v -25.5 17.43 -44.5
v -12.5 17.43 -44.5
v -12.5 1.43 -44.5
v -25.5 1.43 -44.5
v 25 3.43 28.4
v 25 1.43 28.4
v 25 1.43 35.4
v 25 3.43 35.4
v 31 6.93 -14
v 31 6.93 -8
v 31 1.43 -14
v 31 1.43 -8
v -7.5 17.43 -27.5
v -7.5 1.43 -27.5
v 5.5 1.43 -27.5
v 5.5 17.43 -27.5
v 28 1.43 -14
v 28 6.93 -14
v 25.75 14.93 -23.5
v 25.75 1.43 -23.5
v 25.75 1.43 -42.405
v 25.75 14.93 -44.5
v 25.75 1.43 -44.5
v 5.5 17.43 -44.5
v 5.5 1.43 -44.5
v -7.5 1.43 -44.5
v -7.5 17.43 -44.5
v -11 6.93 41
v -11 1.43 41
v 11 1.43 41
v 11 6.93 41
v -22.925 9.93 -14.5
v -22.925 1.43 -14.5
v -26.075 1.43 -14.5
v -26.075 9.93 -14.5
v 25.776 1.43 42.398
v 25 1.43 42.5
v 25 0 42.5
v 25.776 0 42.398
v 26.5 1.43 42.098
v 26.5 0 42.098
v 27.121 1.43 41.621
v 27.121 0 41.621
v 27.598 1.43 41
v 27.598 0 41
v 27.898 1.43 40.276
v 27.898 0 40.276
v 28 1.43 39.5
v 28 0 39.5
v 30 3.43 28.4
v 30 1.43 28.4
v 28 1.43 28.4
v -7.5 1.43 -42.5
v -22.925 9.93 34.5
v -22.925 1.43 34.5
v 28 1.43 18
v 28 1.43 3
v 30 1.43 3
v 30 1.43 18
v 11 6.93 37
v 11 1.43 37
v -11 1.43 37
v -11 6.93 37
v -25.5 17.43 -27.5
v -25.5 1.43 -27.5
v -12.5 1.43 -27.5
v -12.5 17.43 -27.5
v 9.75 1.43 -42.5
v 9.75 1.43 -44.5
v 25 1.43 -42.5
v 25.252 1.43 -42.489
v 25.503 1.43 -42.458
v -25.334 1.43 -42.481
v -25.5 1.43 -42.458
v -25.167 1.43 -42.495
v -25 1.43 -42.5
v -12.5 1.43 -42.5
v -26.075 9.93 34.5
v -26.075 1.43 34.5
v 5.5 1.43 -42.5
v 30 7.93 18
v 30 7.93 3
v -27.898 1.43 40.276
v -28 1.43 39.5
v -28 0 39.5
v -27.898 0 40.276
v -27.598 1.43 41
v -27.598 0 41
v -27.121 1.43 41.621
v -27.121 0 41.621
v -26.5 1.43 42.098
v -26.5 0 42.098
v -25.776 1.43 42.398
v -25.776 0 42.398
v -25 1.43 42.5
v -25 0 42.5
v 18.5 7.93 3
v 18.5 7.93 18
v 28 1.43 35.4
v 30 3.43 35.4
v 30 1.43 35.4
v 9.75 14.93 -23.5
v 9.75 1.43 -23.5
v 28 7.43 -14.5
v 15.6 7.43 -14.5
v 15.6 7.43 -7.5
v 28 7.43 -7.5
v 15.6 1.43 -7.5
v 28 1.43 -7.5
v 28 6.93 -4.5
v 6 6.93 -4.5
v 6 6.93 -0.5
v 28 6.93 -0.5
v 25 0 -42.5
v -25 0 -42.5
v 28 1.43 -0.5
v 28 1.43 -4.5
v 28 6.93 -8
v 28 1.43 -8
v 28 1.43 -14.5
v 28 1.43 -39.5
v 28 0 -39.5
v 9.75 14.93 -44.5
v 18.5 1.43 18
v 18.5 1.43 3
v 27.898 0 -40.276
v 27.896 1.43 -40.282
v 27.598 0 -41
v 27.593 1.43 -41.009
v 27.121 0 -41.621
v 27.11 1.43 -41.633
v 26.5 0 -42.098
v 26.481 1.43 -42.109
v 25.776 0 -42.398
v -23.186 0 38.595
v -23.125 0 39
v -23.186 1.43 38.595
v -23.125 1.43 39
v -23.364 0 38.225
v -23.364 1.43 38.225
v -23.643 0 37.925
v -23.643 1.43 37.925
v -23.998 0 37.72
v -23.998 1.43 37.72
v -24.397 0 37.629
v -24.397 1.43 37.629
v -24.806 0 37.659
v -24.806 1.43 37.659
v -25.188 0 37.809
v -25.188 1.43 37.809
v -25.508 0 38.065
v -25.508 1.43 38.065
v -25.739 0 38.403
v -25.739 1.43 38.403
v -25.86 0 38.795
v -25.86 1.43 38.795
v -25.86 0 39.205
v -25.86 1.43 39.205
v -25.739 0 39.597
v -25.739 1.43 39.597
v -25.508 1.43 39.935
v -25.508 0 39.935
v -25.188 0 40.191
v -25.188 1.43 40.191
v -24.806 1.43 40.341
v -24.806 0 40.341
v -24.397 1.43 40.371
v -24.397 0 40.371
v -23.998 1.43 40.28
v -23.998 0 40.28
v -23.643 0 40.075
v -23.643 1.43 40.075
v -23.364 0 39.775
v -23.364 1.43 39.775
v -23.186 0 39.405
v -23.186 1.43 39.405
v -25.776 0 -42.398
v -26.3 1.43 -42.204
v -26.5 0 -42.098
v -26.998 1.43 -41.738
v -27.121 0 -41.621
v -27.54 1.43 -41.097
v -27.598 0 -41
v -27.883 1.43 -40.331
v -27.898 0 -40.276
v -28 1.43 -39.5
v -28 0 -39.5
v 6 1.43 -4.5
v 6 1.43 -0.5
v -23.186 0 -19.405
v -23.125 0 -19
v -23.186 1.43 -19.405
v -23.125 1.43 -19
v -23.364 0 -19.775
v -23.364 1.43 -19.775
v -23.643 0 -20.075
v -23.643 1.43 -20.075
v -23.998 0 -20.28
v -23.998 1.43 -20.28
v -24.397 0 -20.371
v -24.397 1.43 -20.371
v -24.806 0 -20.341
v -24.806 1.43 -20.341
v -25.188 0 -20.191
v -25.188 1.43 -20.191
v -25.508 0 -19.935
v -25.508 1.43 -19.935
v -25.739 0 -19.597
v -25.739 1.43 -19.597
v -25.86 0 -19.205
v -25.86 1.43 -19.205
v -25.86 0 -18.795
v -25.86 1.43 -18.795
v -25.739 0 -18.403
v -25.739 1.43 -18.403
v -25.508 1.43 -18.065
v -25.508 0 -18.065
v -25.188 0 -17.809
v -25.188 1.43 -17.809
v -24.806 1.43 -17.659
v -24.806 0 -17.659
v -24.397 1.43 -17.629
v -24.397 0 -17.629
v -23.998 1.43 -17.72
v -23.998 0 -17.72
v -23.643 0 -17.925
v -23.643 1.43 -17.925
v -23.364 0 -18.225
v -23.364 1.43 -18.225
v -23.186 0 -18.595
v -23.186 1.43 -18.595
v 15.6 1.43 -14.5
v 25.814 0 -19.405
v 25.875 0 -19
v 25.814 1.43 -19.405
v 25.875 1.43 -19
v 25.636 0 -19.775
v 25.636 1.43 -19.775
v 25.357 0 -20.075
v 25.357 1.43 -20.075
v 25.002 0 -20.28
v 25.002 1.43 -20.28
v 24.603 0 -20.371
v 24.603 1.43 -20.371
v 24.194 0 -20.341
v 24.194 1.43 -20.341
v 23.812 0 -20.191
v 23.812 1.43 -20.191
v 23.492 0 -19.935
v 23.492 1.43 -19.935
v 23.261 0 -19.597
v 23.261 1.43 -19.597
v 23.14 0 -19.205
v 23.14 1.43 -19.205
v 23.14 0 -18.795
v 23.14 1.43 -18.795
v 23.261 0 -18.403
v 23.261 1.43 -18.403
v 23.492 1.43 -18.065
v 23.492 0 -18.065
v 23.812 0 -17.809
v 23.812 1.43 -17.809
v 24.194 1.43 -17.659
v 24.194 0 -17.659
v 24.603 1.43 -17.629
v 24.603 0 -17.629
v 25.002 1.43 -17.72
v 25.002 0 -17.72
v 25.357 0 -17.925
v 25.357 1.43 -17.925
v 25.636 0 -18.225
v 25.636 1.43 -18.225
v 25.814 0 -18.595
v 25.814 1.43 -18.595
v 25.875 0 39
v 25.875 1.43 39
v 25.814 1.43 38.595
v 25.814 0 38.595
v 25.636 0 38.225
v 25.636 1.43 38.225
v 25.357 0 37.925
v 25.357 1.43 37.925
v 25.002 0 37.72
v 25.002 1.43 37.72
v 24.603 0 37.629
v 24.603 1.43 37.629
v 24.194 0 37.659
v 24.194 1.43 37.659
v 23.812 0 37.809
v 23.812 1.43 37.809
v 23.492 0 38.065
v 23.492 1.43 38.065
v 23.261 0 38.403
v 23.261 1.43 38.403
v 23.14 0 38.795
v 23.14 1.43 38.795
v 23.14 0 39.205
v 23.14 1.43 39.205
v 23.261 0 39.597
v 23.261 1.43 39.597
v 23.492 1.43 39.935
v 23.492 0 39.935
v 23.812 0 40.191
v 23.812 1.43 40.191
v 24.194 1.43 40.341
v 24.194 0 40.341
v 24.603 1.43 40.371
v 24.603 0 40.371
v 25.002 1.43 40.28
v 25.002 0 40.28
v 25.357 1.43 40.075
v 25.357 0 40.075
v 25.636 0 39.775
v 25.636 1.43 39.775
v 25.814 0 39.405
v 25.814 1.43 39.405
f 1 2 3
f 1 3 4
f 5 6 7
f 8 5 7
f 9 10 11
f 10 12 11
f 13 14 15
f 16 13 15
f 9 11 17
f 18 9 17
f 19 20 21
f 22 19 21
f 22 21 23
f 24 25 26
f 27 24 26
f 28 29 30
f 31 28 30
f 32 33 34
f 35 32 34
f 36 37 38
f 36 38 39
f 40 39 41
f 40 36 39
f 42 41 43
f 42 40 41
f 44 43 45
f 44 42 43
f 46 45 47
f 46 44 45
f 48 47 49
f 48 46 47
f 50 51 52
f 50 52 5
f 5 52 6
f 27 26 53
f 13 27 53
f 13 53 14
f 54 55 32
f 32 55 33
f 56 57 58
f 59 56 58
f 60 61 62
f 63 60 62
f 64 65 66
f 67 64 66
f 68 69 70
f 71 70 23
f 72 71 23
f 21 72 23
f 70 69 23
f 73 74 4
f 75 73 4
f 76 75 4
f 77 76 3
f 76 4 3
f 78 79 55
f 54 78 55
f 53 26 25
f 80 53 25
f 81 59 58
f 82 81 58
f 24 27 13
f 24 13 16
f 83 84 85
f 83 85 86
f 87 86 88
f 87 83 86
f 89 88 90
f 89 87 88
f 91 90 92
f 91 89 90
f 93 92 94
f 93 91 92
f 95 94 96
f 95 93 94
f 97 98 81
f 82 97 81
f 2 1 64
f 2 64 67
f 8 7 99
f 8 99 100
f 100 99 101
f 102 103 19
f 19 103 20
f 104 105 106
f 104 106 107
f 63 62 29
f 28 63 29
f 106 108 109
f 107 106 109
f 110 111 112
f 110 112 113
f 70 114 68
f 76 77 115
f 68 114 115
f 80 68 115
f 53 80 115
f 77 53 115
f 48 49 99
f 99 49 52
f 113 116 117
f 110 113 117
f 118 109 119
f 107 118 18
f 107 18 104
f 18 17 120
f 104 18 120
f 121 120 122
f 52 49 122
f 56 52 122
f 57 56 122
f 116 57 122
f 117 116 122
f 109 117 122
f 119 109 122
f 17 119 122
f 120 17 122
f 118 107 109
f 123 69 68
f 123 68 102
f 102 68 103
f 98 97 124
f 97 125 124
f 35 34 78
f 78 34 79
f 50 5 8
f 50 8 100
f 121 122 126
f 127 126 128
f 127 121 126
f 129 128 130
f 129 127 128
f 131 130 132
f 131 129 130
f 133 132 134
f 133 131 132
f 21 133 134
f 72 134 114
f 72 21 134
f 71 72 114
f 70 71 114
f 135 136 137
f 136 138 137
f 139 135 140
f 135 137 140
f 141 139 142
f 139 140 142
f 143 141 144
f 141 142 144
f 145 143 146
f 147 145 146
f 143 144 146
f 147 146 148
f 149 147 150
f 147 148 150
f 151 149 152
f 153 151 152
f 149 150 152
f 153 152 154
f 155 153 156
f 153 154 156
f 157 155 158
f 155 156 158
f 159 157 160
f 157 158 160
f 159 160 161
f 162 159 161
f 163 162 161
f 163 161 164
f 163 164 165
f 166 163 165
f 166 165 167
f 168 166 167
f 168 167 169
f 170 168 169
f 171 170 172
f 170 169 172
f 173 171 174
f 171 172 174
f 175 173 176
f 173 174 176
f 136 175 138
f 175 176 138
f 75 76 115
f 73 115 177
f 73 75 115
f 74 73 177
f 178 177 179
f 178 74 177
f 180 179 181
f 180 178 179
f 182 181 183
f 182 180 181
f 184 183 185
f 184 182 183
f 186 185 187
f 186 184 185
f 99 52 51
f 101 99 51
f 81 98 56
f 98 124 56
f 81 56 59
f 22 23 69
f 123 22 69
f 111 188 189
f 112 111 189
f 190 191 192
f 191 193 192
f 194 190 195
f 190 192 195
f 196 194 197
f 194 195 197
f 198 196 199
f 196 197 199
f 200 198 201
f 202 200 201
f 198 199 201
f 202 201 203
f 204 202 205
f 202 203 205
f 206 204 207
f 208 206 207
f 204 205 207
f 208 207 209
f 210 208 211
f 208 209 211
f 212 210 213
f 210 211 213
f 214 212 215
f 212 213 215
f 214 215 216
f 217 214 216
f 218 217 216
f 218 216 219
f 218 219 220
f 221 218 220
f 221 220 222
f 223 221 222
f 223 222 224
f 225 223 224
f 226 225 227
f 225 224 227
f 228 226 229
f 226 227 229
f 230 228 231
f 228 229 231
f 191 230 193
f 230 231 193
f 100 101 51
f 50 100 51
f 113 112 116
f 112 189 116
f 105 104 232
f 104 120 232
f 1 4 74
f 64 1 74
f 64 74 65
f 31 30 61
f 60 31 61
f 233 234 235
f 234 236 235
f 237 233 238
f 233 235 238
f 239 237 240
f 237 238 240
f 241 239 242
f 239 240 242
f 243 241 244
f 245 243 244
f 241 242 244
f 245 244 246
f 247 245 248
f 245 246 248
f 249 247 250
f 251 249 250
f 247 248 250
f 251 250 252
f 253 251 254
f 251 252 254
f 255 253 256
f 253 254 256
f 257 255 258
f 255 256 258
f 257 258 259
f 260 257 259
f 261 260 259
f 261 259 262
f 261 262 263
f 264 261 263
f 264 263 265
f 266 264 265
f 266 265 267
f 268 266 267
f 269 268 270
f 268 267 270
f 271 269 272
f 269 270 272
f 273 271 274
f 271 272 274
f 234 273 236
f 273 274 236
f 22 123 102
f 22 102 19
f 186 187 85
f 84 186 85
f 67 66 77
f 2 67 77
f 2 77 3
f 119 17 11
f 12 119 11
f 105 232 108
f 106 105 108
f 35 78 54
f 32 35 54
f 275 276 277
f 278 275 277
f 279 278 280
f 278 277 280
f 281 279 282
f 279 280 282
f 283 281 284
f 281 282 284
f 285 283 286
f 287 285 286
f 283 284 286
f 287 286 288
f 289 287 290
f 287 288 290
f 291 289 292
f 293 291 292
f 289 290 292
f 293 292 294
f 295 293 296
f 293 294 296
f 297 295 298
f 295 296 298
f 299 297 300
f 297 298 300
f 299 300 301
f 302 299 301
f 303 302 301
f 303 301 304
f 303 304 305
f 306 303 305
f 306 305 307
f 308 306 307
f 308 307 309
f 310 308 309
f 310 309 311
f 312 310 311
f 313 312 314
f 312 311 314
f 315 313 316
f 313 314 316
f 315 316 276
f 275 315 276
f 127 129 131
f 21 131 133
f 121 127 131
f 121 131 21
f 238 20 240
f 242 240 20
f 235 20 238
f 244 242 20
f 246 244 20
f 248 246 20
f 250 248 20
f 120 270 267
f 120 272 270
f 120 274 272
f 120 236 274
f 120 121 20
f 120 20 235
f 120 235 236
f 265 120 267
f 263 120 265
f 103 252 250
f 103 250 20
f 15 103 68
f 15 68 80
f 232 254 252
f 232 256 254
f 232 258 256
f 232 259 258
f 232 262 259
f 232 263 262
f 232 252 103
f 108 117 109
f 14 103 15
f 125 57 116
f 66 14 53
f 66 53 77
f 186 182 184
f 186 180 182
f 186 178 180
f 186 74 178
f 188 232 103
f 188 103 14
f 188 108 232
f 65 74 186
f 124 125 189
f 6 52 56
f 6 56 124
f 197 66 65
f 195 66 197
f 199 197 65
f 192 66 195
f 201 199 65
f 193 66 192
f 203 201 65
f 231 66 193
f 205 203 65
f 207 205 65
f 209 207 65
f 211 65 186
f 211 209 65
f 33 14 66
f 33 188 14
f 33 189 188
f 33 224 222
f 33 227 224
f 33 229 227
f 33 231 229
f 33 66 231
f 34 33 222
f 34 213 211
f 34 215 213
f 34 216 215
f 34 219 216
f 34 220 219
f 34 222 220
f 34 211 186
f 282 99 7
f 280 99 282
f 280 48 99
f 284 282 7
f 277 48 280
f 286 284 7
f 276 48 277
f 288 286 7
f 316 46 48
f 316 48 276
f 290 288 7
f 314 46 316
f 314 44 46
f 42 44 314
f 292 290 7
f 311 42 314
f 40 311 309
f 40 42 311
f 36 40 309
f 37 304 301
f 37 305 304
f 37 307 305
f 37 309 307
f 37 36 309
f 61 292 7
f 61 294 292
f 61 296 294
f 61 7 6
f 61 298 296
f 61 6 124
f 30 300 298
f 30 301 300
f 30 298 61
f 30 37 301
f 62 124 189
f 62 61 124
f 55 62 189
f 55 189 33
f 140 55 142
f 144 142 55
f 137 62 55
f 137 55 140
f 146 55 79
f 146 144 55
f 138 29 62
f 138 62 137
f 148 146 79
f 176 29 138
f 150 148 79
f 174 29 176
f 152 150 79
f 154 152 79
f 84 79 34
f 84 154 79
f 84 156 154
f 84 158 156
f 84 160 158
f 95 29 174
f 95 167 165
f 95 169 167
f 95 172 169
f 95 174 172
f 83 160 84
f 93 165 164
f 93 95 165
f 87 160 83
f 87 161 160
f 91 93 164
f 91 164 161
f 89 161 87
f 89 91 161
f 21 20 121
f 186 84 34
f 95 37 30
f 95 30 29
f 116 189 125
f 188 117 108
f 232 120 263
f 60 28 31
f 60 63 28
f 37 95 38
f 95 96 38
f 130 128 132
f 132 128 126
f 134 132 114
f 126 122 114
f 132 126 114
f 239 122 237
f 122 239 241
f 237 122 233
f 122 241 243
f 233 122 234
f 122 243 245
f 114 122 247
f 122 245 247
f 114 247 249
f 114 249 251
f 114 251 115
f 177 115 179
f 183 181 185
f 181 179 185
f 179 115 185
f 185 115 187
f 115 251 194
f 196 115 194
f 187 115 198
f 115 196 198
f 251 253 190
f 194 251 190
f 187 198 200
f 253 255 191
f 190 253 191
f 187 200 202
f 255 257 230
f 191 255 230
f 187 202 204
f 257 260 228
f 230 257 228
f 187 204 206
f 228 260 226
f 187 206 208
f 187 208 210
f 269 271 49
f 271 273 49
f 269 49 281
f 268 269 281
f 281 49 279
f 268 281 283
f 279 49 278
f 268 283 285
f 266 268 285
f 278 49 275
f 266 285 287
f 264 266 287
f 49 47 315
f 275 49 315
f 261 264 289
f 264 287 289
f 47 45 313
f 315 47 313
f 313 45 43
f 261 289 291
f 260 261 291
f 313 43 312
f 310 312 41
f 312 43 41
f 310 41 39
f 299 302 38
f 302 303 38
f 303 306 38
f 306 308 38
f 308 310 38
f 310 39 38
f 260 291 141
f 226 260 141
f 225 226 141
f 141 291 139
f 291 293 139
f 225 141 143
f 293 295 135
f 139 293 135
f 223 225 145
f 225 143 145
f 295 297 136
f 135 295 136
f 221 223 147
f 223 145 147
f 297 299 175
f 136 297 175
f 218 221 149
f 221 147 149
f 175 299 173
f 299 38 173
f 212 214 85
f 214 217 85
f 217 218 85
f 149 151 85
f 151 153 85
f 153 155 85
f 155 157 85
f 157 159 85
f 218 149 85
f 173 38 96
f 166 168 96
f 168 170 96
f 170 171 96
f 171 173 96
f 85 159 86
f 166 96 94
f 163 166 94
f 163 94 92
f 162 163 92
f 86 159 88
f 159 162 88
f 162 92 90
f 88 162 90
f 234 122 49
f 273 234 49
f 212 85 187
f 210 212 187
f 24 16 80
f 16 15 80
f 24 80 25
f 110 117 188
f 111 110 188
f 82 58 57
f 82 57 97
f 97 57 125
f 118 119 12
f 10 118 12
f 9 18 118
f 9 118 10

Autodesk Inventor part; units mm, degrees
ref_plane "YZ Plane" through (0, 0, 0) normal (1, 0, 0) x (0, 1, 0)
ref_plane "XZ Plane" through (0, 0, 0) normal (0, 1, 0) x (-1, 0, 0)
ref_plane "XY Plane" through (0, 0, 0) normal (0, 0, 1) x (1, 0, 0)
sketch "Sketch1" plane through (0, 0, 0) normal (0, 1, 0) x (-1, 0, 0)
  line L0 (28, 42.5) -> (-28, 42.5)
  line L1 (-28, 42.5) -> (-28, -42.5)
  line L2 (-28, -42.5) -> (28, -42.5)
  line L3 (28, -42.5) -> (28, 42.5)
  point P0 (0, 0)
  point P1 (28, 0)
  point P2 (0, -42.5)
  dimension "d0" = 85
  dimension "d1" = 56
extrude "Extrusion1" add sketch "Sketch1" along normal blind 1.43
sketch "Sketch2" plane through (0, 1.43, 0) normal (0, 1, 0) x (1, 0, 0)
  line L0 (-28, -42.5) -> (28, -42.5) projected
  line L1 (28, -42.5) -> (28, 42.5) projected
  line L2 (28, 42.5) -> (-28, 42.5) projected
  line L3 (-28, 42.5) -> (-28, -42.5) projected
  circle A0 centre (-24.5, -39) radius 1.375
  circle A1 centre (-24.5, 19) radius 1.375
  circle A2 centre (24.5, 19) radius 1.375
  circle A3 centre (24.5, -39) radius 1.375
  point P0 (0, 0)
  dimension "d4" = 2.75
  dimension "d5" = 2.75
  dimension "d6" = 2.75
  dimension "d7" = 2.75
  dimension "d8" = 49
  dimension "d9" = 58
  dimension "d10" = 3.5
  dimension "d11" = 3.5
extrude "Extrusion2" cut sketch "Sketch2" against normal through all contours A0 | A1 | A2 | A3
fillet "Fillet1" radius 3 4 edges at (-28, 0.715, 42.5) (28, 0.715, 42.5) (28, 0.715, -42.5) (-28, 0.715, -42.5)
sketch "Sketch3" plane through (0, 1.43, 0) normal (0, 1, 0) x (1, 0, 0)
  circle A0 centre (24.5, 19) radius 1.375 projected
  circle A1 centre (-24.5, -39) radius 1.375 projected
  circle A2 centre (-24.5, 19) radius 1.375 projected
  circle A3 centre (24.5, -39) radius 1.375 projected
  arc A4 (-25, 42.5) -> (-28, 39.5) centre (-25, 39.5) ccw projected
  line L0 (-28, 39.5) -> (-28, -39.5) projected
  arc A5 (-28, -39.5) -> (-25, -42.5) centre (-25, -39.5) ccw projected
  line L1 (-25, -42.5) -> (25, -42.5) projected
  arc A6 (25, -42.5) -> (28, -39.5) centre (25, -39.5) ccw projected
  line L2 (28, -39.5) -> (28, 39.5) projected
  arc A7 (28, 39.5) -> (25, 42.5) centre (25, 39.5) ccw projected
  line L3 (25, 42.5) -> (-25, 42.5) projected
  line L4 (-25.5, 27.5) -> (-12.5, 27.5)
  line L5 (-12.5, 27.5) -> (-12.5, 44.5)
  line L6 (-12.5, 44.5) -> (-25.5, 44.5)
  line L7 (-25.5, 44.5) -> (-25.5, 27.5)
  line L8 (-7.5, 27.5) -> (5.5, 27.5)
  line L9 (5.5, 27.5) -> (5.5, 44.5)
  line L10 (5.5, 44.5) -> (-7.5, 44.5)
  line L11 (-7.5, 44.5) -> (-7.5, 27.5)
  point P0 (0, 0)
  point P1 (-19, 44.5)
  point P2 (-1, 44.5)
  dimension "d15" = 2
  dimension "d16" = 29
  dimension "d17" = 47
  dimension "d18" = 13
  dimension "d19" = 13
  dimension "d20" = 17
extrude "Extrusion3" add sketch "Sketch3" along normal blind 16 contours L3 L5 L4 L7 A4 | A4 L7 L6 L5 L3 | L11 L10 L9 L3 | L3 L9 L8 L11
sketch "Sketch4" plane through (0, 1.43, 0) normal (0, 1, 0) x (1, 0, 0)
  line L0 (-7.5, 27.5) -> (-7.5, 42.5) projected
  line L1 (-7.5, 42.5) -> (-12.5, 42.5) projected
  line L2 (-12.5, 42.5) -> (-12.5, 27.5) projected
  line L3 (-12.5, 27.5) -> (-25.5, 27.5) projected
  line L4 (-25.5, 27.5) -> (-25.5, 42.458) projected
  arc A0 (-25.5, 42.458) -> (-28, 39.5) centre (-25, 39.5) ccw projected
  line L5 (-28, 39.5) -> (-28, -39.5) projected
  arc A1 (-28, -39.5) -> (-25, -42.5) centre (-25, -39.5) ccw projected
  line L6 (-25, -42.5) -> (25, -42.5) projected
  arc A2 (25, -42.5) -> (28, -39.5) centre (25, -39.5) ccw projected
  line L7 (28, -39.5) -> (28, 39.5) projected
  arc A3 (28, 39.5) -> (25, 42.5) centre (25, 39.5) ccw projected
  line L8 (25, 42.5) -> (5.5, 42.5) projected
  line L9 (5.5, 42.5) -> (5.5, 27.5) projected
  line L10 (5.5, 27.5) -> (-7.5, 27.5) projected
  circle A4 centre (24.5, 19) radius 1.375 projected
  circle A5 centre (-24.5, -39) radius 1.375 projected
  circle A6 centre (-24.5, 19) radius 1.375 projected
  circle A7 centre (24.5, -39) radius 1.375 projected
  line L11 (-7.5, 27.5) -> (5.5, 27.5) projected
  line L12 (5.5, 27.5) -> (5.5, 44.5) projected
  line L13 (5.5, 44.5) -> (-7.5, 44.5) projected
  line L14 (-7.5, 44.5) -> (-7.5, 27.5) projected
  line L15 (9.75, 23.5) -> (25.75, 23.5)
  line L16 (25.75, 23.5) -> (25.75, 44.5)
  line L17 (25.75, 44.5) -> (9.75, 44.5)
  line L18 (9.75, 44.5) -> (9.75, 23.5)
  point P0 (0, 0)
  point P1 (17.75, 44.5)
  dimension "d23" = 10.25
  dimension "d24" = 21
  dimension "d25" = 16
extrude "Extrusion4" add sketch "Sketch4" along normal blind 13.5 contours L18 L17 L16 A3 L8 | L8 A3 L16 L15 L18
sketch "Sketch5" plane through (0, 1.43, 0) normal (0, 1, 0) x (1, 0, 0)
  line L0 (9.75, 23.5) -> (9.75, 42.5) projected
  line L1 (9.75, 42.5) -> (5.5, 42.5) projected
  line L2 (5.5, 42.5) -> (5.5, 27.5) projected
  line L3 (5.5, 27.5) -> (-7.5, 27.5) projected
  line L4 (-7.5, 27.5) -> (-7.5, 42.5) projected
  line L5 (-7.5, 42.5) -> (-12.5, 42.5) projected
  line L6 (-12.5, 42.5) -> (-12.5, 27.5) projected
  line L7 (-12.5, 27.5) -> (-25.5, 27.5) projected
  line L8 (-25.5, 27.5) -> (-25.5, 42.458) projected
  arc A0 (-25.5, 42.458) -> (-28, 39.5) centre (-25, 39.5) ccw projected
  line L9 (-28, 39.5) -> (-28, -39.5) projected
  arc A1 (-28, -39.5) -> (-25, -42.5) centre (-25, -39.5) ccw projected
  line L10 (-25, -42.5) -> (25, -42.5) projected
  arc A2 (25, -42.5) -> (28, -39.5) centre (25, -39.5) ccw projected
  line L11 (28, -39.5) -> (28, 39.5) projected
  arc A3 (28, 39.5) -> (25.75, 42.4047) centre (25, 39.5) ccw projected
  line L12 (25.75, 42.4047) -> (25.75, 23.5) projected
  line L13 (25.75, 23.5) -> (9.75, 23.5) projected
  circle A4 centre (24.5, 19) radius 1.375 projected
  circle A5 centre (-24.5, -39) radius 1.375 projected
  circle A6 centre (-24.5, 19) radius 1.375 projected
  circle A7 centre (24.5, -39) radius 1.375 projected
  line L14 (-26.075, -34.5) -> (-22.925, -34.5)
  line L15 (-22.925, -34.5) -> (-22.925, 14.5)
  line L16 (-22.925, 14.5) -> (-26.075, 14.5)
  line L17 (-26.075, 14.5) -> (-26.075, -34.5)
  point P0 (0, 0)
  point P1 (-26.075, -10)
  point P2 (-24.5, -34.5)
  dimension "d28" = 3.15
  dimension "d29" = 49
  dimension "d31" = 29
extrude "Extrusion5" add sketch "Sketch5" along normal blind 8.5 contours L17 L16 L15 L14
sketch "Sketch6" plane through (0, 1.43, 0) normal (0, 1, 0) x (1, 0, 0)
  line L0 (-26.075, -34.5) -> (-26.075, 14.5) projected
  line L1 (-26.075, 14.5) -> (-22.925, 14.5) projected
  line L2 (-22.925, 14.5) -> (-22.925, -34.5) projected
  line L3 (-22.925, -34.5) -> (-26.075, -34.5) projected
  line L4 (9.75, 23.5) -> (9.75, 42.5) projected
  line L5 (9.75, 42.5) -> (5.5, 42.5) projected
  line L6 (5.5, 42.5) -> (5.5, 27.5) projected
  line L7 (5.5, 27.5) -> (-7.5, 27.5) projected
  line L8 (-7.5, 27.5) -> (-7.5, 42.5) projected
  line L9 (-7.5, 42.5) -> (-12.5, 42.5) projected
  line L10 (-12.5, 42.5) -> (-12.5, 27.5) projected
  line L11 (-12.5, 27.5) -> (-25.5, 27.5) projected
  line L12 (-25.5, 27.5) -> (-25.5, 42.458) projected
  arc A0 (-25.5, 42.458) -> (-28, 39.5) centre (-25, 39.5) ccw projected
  line L13 (-28, 39.5) -> (-28, -39.5) projected
  arc A1 (-28, -39.5) -> (-25, -42.5) centre (-25, -39.5) ccw projected
  line L14 (-25, -42.5) -> (25, -42.5) projected
  arc A2 (25, -42.5) -> (28, -39.5) centre (25, -39.5) ccw projected
  line L15 (28, -39.5) -> (28, 39.5) projected
  arc A3 (28, 39.5) -> (25.75, 42.4047) centre (25, 39.5) ccw projected
  line L16 (25.75, 42.4047) -> (25.75, 23.5) projected
  line L17 (25.75, 23.5) -> (9.75, 23.5) projected
  circle A4 centre (24.5, 19) radius 1.375 projected
  circle A5 centre (-24.5, -39) radius 1.375 projected
  circle A6 centre (-24.5, 19) radius 1.375 projected
  circle A7 centre (24.5, -39) radius 1.375 projected
  line L18 (18.5, -18) -> (30, -18)
  line L19 (30, -18) -> (30, -3)
  line L20 (30, -3) -> (18.5, -3)
  line L21 (18.5, -3) -> (18.5, -18)
  point P0 (0, 0)
  point P1 (30, -10.5)
  dimension "d34" = 2
  dimension "d35" = 11.5
  dimension "d36" = 15
  dimension "d37" = 32
extrude "Extrusion6" add sketch "Sketch6" along normal blind 6.5 contours L20 L19 L18 L15 | L15 L18 L21 L20
sketch "Sketch7" plane through (0, 1.43, 0) normal (0, 1, 0) x (1, 0, 0)
  line L0 (18.5, -3) -> (28, -3) projected
  line L1 (28, -3) -> (28, 39.5) projected
  arc A0 (28, 39.5) -> (25.75, 42.4047) centre (25, 39.5) ccw projected
  line L2 (25.75, 42.4047) -> (25.75, 23.5) projected
  line L3 (25.75, 23.5) -> (9.75, 23.5) projected
  line L4 (9.75, 23.5) -> (9.75, 42.5) projected
  line L5 (9.75, 42.5) -> (5.5, 42.5) projected
  line L6 (5.5, 42.5) -> (5.5, 27.5) projected
  line L7 (5.5, 27.5) -> (-7.5, 27.5) projected
  line L8 (-7.5, 27.5) -> (-7.5, 42.5) projected
  line L9 (-7.5, 42.5) -> (-12.5, 42.5) projected
  line L10 (-12.5, 42.5) -> (-12.5, 27.5) projected
  line L11 (-12.5, 27.5) -> (-25.5, 27.5) projected
  line L12 (-25.5, 27.5) -> (-25.5, 42.458) projected
  arc A1 (-25.5, 42.458) -> (-28, 39.5) centre (-25, 39.5) ccw projected
  line L13 (-28, 39.5) -> (-28, -39.5) projected
  arc A2 (-28, -39.5) -> (-25, -42.5) centre (-25, -39.5) ccw projected
  line L14 (-25, -42.5) -> (25, -42.5) projected
  arc A3 (25, -42.5) -> (28, -39.5) centre (25, -39.5) ccw projected
  line L15 (28, -39.5) -> (28, -18) projected
  line L16 (28, -18) -> (18.5, -18) projected
  line L17 (18.5, -18) -> (18.5, -3) projected
  line L18 (-26.075, -34.5) -> (-26.075, 14.5) projected
  line L19 (-26.075, 14.5) -> (-22.925, 14.5) projected
  line L20 (-22.925, 14.5) -> (-22.925, -34.5) projected
  line L21 (-22.925, -34.5) -> (-26.075, -34.5) projected
  circle A4 centre (24.5, 19) radius 1.375 projected
  circle A5 centre (-24.5, -39) radius 1.375 projected
  circle A6 centre (-24.5, 19) radius 1.375 projected
  circle A7 centre (24.5, -39) radius 1.375 projected
  line L22 (18.5, -18) -> (30, -18) projected
  line L23 (30, -18) -> (30, -3) projected
  line L24 (30, -3) -> (18.5, -3) projected
  line L25 (18.5, -3) -> (18.5, -18) projected
  line L26 (28, -39.5) -> (28, 39.5) projected
  line L27 (6, 0.5) -> (28, 0.5)
  line L28 (28, 0.5) -> (28, 4.5)
  line L29 (28, 4.5) -> (6, 4.5)
  line L30 (6, 4.5) -> (6, 0.5)
  line L31 (-11, -41) -> (11, -41)
  line L32 (11, -41) -> (11, -37)
  line L33 (11, -37) -> (-11, -37)
  line L34 (-11, -37) -> (-11, -41)
  point P0 (0, 0)
  point P1 (28, 2.5)
  point P2 (0, -41)
  point P3 (30, -10.5)
  point P4 (11, -39)
  dimension "d40" = 22
  dimension "d41" = 22
  dimension "d42" = 4
  dimension "d43" = 4
  dimension "d44" = 28
  dimension "d45" = 13
extrude "Extrusion7" add sketch "Sketch7" along normal blind 5.5 contours L27 L30 L29 L1 | L34 L33 L32 L31
sketch "Sketch8" plane through (0, 1.43, 0) normal (0, 1, 0) x (1, 0, 0)
  circle A0 centre (24.5, -39) radius 1.375 projected
  circle A1 centre (-24.5, 19) radius 1.375 projected
  circle A2 centre (-24.5, -39) radius 1.375 projected
  circle A3 centre (24.5, 19) radius 1.375 projected
  line L0 (-26.075, -34.5) -> (-26.075, 14.5) projected
  line L1 (-26.075, 14.5) -> (-22.925, 14.5) projected
  line L2 (-22.925, 14.5) -> (-22.925, -34.5) projected
  line L3 (-22.925, -34.5) -> (-26.075, -34.5) projected
  line L4 (28, 0.5) -> (6, 0.5) projected
  line L5 (6, 0.5) -> (6, 4.5) projected
  line L6 (6, 4.5) -> (28, 4.5) projected
  line L7 (28, 4.5) -> (28, 39.5) projected
  arc A4 (28, 39.5) -> (25.75, 42.4047) centre (25, 39.5) ccw projected
  line L8 (25.75, 42.4047) -> (25.75, 23.5) projected
  line L9 (25.75, 23.5) -> (9.75, 23.5) projected
  line L10 (9.75, 23.5) -> (9.75, 42.5) projected
  line L11 (9.75, 42.5) -> (5.5, 42.5) projected
  line L12 (5.5, 42.5) -> (5.5, 27.5) projected
  line L13 (5.5, 27.5) -> (-7.5, 27.5) projected
  line L14 (-7.5, 27.5) -> (-7.5, 42.5) projected
  line L15 (-7.5, 42.5) -> (-12.5, 42.5) projected
  line L16 (-12.5, 42.5) -> (-12.5, 27.5) projected
  line L17 (-12.5, 27.5) -> (-25.5, 27.5) projected
  line L18 (-25.5, 27.5) -> (-25.5, 42.458) projected
  arc A5 (-25.5, 42.458) -> (-28, 39.5) centre (-25, 39.5) ccw projected
  line L19 (-28, 39.5) -> (-28, -39.5) projected
  arc A6 (-28, -39.5) -> (-25, -42.5) centre (-25, -39.5) ccw projected
  line L20 (-25, -42.5) -> (25, -42.5) projected
  arc A7 (25, -42.5) -> (28, -39.5) centre (25, -39.5) ccw projected
  line L21 (28, -39.5) -> (28, -18) projected
  line L22 (28, -18) -> (18.5, -18) projected
  line L23 (18.5, -18) -> (18.5, -3) projected
  line L24 (18.5, -3) -> (28, -3) projected
  line L25 (28, -3) -> (28, 0.5) projected
  line L26 (-11, -41) -> (-11, -37) projected
  line L27 (-11, -37) -> (11, -37) projected
  line L28 (11, -37) -> (11, -41) projected
  line L29 (11, -41) -> (-11, -41) projected
  line L30 (15.6, 7.5) -> (28, 7.5)
  line L31 (28, 7.5) -> (28, 14.5)
  line L32 (28, 14.5) -> (15.6, 14.5)
  line L33 (15.6, 14.5) -> (15.6, 7.5)
  line L34 (28, 8) -> (31, 8)
  line L35 (31, 8) -> (31, 14)
  line L36 (31, 14) -> (28, 14)
  line L37 (28, 14) -> (28, 8)
  point P0 (0, 0)
  point P1 (31, 11)
  point P2 (28, 11)
  point P3 (31, 11)
  dimension "d48" = 7
  dimension "d49" = 6
  dimension "d50" = 12.4
  dimension "d51" = 3
  dimension "d52" = 53.5
extrude "Extrusion8" add sketch "Sketch8" along normal blind 6 contours L30 L33 L32 L7 | L7 L36 L35 L34
sketch "Sketch9" plane through (0, 7.43, 0) normal (0, 1, 0) x (1, 0, 0)
  line L0 (28, 8) -> (31, 8) projected
  line L1 (31, 8) -> (31, 14) projected
  line L2 (31, 14) -> (28, 14) projected
  line L3 (28, 14) -> (28, 14.5) projected
  line L4 (28, 14.5) -> (15.6, 14.5) projected
  line L5 (15.6, 14.5) -> (15.6, 7.5) projected
  line L6 (15.6, 7.5) -> (28, 7.5) projected
  line L7 (28, 7.5) -> (28, 8) projected
  line L8 (28, 8) -> (31, 8)
  line L9 (31, 8) -> (31, 14)
  line L10 (31, 14) -> (28, 14)
  line L11 (28, 14) -> (28, 8)
  point P0 (0, 0)
extrude "Extrusion9" cut sketch "Sketch9" against normal blind 0.5 contours L11 L2 L1 L0
sketch "Sketch10" plane through (0, 1.43, 0) normal (0, 1, 0) x (1, 0, 0)
  line L0 (15.6, 14.5) -> (28, 14.5) projected
  line L1 (28, 14.5) -> (28, 39.5) projected
  arc A0 (28, 39.5) -> (25.75, 42.4047) centre (25, 39.5) ccw projected
  line L2 (25.75, 42.4047) -> (25.75, 23.5) projected
  line L3 (25.75, 23.5) -> (9.75, 23.5) projected
  line L4 (9.75, 23.5) -> (9.75, 42.5) projected
  line L5 (9.75, 42.5) -> (5.5, 42.5) projected
  line L6 (5.5, 42.5) -> (5.5, 27.5) projected
  line L7 (5.5, 27.5) -> (-7.5, 27.5) projected
  line L8 (-7.5, 27.5) -> (-7.5, 42.5) projected
  line L9 (-7.5, 42.5) -> (-12.5, 42.5) projected
  line L10 (-12.5, 42.5) -> (-12.5, 27.5) projected
  line L11 (-12.5, 27.5) -> (-25.5, 27.5) projected
  line L12 (-25.5, 27.5) -> (-25.5, 42.458) projected
  arc A1 (-25.5, 42.458) -> (-28, 39.5) centre (-25, 39.5) ccw projected
  line L13 (-28, 39.5) -> (-28, -39.5) projected
  arc A2 (-28, -39.5) -> (-25, -42.5) centre (-25, -39.5) ccw projected
  line L14 (-25, -42.5) -> (25, -42.5) projected
  arc A3 (25, -42.5) -> (28, -39.5) centre (25, -39.5) ccw projected
  line L15 (28, -39.5) -> (28, -18) projected
  line L16 (28, -18) -> (18.5, -18) projected
  line L17 (18.5, -18) -> (18.5, -3) projected
  line L18 (18.5, -3) -> (28, -3) projected
  line L19 (28, -3) -> (28, 0.5) projected
  line L20 (28, 0.5) -> (6, 0.5) projected
  line L21 (6, 0.5) -> (6, 4.5) projected
  line L22 (6, 4.5) -> (28, 4.5) projected
  line L23 (28, 4.5) -> (28, 7.5) projected
  line L24 (28, 7.5) -> (15.6, 7.5) projected
  line L25 (15.6, 7.5) -> (15.6, 14.5) projected
  circle A4 centre (24.5, -39) radius 1.375 projected
  circle A5 centre (-24.5, 19) radius 1.375 projected
  circle A6 centre (-24.5, -39) radius 1.375 projected
  circle A7 centre (24.5, 19) radius 1.375 projected
  line L26 (-26.075, -34.5) -> (-26.075, 14.5) projected
  line L27 (-26.075, 14.5) -> (-22.925, 14.5) projected
  line L28 (-22.925, 14.5) -> (-22.925, -34.5) projected
  line L29 (-22.925, -34.5) -> (-26.075, -34.5) projected
  line L30 (-11, -41) -> (-11, -37) projected
  line L31 (-11, -37) -> (11, -37) projected
  line L32 (11, -37) -> (11, -41) projected
  line L33 (11, -41) -> (-11, -41) projected
  line L34 (25, -35.4) -> (30, -35.4)
  line L35 (30, -35.4) -> (30, -28.4)
  line L36 (30, -28.4) -> (25, -28.4)
  line L37 (25, -28.4) -> (25, -35.4)
  point P0 (0, 0)
  point P1 (30, -31.9)
  dimension "d57" = 2
  dimension "d58" = 10.6
  dimension "d59" = 5
  dimension "d60" = 7
extrude "Extrusion10" add sketch "Sketch10" along normal blind 2 contours L36 L35 L34 L15 | L15 L34 L37 L36
equation "\"d5\" = d4"
equation "\"d6\" = d4"
equation "\"d7\" = d4"
equation "\"d11\" = d10"
equation "\"d19\" = d18"
equation "\"d41\" = d40"
equation "\"d43\" = d42"
properties part number "RaspberryPi3B+" material "Aluminum 6061"
